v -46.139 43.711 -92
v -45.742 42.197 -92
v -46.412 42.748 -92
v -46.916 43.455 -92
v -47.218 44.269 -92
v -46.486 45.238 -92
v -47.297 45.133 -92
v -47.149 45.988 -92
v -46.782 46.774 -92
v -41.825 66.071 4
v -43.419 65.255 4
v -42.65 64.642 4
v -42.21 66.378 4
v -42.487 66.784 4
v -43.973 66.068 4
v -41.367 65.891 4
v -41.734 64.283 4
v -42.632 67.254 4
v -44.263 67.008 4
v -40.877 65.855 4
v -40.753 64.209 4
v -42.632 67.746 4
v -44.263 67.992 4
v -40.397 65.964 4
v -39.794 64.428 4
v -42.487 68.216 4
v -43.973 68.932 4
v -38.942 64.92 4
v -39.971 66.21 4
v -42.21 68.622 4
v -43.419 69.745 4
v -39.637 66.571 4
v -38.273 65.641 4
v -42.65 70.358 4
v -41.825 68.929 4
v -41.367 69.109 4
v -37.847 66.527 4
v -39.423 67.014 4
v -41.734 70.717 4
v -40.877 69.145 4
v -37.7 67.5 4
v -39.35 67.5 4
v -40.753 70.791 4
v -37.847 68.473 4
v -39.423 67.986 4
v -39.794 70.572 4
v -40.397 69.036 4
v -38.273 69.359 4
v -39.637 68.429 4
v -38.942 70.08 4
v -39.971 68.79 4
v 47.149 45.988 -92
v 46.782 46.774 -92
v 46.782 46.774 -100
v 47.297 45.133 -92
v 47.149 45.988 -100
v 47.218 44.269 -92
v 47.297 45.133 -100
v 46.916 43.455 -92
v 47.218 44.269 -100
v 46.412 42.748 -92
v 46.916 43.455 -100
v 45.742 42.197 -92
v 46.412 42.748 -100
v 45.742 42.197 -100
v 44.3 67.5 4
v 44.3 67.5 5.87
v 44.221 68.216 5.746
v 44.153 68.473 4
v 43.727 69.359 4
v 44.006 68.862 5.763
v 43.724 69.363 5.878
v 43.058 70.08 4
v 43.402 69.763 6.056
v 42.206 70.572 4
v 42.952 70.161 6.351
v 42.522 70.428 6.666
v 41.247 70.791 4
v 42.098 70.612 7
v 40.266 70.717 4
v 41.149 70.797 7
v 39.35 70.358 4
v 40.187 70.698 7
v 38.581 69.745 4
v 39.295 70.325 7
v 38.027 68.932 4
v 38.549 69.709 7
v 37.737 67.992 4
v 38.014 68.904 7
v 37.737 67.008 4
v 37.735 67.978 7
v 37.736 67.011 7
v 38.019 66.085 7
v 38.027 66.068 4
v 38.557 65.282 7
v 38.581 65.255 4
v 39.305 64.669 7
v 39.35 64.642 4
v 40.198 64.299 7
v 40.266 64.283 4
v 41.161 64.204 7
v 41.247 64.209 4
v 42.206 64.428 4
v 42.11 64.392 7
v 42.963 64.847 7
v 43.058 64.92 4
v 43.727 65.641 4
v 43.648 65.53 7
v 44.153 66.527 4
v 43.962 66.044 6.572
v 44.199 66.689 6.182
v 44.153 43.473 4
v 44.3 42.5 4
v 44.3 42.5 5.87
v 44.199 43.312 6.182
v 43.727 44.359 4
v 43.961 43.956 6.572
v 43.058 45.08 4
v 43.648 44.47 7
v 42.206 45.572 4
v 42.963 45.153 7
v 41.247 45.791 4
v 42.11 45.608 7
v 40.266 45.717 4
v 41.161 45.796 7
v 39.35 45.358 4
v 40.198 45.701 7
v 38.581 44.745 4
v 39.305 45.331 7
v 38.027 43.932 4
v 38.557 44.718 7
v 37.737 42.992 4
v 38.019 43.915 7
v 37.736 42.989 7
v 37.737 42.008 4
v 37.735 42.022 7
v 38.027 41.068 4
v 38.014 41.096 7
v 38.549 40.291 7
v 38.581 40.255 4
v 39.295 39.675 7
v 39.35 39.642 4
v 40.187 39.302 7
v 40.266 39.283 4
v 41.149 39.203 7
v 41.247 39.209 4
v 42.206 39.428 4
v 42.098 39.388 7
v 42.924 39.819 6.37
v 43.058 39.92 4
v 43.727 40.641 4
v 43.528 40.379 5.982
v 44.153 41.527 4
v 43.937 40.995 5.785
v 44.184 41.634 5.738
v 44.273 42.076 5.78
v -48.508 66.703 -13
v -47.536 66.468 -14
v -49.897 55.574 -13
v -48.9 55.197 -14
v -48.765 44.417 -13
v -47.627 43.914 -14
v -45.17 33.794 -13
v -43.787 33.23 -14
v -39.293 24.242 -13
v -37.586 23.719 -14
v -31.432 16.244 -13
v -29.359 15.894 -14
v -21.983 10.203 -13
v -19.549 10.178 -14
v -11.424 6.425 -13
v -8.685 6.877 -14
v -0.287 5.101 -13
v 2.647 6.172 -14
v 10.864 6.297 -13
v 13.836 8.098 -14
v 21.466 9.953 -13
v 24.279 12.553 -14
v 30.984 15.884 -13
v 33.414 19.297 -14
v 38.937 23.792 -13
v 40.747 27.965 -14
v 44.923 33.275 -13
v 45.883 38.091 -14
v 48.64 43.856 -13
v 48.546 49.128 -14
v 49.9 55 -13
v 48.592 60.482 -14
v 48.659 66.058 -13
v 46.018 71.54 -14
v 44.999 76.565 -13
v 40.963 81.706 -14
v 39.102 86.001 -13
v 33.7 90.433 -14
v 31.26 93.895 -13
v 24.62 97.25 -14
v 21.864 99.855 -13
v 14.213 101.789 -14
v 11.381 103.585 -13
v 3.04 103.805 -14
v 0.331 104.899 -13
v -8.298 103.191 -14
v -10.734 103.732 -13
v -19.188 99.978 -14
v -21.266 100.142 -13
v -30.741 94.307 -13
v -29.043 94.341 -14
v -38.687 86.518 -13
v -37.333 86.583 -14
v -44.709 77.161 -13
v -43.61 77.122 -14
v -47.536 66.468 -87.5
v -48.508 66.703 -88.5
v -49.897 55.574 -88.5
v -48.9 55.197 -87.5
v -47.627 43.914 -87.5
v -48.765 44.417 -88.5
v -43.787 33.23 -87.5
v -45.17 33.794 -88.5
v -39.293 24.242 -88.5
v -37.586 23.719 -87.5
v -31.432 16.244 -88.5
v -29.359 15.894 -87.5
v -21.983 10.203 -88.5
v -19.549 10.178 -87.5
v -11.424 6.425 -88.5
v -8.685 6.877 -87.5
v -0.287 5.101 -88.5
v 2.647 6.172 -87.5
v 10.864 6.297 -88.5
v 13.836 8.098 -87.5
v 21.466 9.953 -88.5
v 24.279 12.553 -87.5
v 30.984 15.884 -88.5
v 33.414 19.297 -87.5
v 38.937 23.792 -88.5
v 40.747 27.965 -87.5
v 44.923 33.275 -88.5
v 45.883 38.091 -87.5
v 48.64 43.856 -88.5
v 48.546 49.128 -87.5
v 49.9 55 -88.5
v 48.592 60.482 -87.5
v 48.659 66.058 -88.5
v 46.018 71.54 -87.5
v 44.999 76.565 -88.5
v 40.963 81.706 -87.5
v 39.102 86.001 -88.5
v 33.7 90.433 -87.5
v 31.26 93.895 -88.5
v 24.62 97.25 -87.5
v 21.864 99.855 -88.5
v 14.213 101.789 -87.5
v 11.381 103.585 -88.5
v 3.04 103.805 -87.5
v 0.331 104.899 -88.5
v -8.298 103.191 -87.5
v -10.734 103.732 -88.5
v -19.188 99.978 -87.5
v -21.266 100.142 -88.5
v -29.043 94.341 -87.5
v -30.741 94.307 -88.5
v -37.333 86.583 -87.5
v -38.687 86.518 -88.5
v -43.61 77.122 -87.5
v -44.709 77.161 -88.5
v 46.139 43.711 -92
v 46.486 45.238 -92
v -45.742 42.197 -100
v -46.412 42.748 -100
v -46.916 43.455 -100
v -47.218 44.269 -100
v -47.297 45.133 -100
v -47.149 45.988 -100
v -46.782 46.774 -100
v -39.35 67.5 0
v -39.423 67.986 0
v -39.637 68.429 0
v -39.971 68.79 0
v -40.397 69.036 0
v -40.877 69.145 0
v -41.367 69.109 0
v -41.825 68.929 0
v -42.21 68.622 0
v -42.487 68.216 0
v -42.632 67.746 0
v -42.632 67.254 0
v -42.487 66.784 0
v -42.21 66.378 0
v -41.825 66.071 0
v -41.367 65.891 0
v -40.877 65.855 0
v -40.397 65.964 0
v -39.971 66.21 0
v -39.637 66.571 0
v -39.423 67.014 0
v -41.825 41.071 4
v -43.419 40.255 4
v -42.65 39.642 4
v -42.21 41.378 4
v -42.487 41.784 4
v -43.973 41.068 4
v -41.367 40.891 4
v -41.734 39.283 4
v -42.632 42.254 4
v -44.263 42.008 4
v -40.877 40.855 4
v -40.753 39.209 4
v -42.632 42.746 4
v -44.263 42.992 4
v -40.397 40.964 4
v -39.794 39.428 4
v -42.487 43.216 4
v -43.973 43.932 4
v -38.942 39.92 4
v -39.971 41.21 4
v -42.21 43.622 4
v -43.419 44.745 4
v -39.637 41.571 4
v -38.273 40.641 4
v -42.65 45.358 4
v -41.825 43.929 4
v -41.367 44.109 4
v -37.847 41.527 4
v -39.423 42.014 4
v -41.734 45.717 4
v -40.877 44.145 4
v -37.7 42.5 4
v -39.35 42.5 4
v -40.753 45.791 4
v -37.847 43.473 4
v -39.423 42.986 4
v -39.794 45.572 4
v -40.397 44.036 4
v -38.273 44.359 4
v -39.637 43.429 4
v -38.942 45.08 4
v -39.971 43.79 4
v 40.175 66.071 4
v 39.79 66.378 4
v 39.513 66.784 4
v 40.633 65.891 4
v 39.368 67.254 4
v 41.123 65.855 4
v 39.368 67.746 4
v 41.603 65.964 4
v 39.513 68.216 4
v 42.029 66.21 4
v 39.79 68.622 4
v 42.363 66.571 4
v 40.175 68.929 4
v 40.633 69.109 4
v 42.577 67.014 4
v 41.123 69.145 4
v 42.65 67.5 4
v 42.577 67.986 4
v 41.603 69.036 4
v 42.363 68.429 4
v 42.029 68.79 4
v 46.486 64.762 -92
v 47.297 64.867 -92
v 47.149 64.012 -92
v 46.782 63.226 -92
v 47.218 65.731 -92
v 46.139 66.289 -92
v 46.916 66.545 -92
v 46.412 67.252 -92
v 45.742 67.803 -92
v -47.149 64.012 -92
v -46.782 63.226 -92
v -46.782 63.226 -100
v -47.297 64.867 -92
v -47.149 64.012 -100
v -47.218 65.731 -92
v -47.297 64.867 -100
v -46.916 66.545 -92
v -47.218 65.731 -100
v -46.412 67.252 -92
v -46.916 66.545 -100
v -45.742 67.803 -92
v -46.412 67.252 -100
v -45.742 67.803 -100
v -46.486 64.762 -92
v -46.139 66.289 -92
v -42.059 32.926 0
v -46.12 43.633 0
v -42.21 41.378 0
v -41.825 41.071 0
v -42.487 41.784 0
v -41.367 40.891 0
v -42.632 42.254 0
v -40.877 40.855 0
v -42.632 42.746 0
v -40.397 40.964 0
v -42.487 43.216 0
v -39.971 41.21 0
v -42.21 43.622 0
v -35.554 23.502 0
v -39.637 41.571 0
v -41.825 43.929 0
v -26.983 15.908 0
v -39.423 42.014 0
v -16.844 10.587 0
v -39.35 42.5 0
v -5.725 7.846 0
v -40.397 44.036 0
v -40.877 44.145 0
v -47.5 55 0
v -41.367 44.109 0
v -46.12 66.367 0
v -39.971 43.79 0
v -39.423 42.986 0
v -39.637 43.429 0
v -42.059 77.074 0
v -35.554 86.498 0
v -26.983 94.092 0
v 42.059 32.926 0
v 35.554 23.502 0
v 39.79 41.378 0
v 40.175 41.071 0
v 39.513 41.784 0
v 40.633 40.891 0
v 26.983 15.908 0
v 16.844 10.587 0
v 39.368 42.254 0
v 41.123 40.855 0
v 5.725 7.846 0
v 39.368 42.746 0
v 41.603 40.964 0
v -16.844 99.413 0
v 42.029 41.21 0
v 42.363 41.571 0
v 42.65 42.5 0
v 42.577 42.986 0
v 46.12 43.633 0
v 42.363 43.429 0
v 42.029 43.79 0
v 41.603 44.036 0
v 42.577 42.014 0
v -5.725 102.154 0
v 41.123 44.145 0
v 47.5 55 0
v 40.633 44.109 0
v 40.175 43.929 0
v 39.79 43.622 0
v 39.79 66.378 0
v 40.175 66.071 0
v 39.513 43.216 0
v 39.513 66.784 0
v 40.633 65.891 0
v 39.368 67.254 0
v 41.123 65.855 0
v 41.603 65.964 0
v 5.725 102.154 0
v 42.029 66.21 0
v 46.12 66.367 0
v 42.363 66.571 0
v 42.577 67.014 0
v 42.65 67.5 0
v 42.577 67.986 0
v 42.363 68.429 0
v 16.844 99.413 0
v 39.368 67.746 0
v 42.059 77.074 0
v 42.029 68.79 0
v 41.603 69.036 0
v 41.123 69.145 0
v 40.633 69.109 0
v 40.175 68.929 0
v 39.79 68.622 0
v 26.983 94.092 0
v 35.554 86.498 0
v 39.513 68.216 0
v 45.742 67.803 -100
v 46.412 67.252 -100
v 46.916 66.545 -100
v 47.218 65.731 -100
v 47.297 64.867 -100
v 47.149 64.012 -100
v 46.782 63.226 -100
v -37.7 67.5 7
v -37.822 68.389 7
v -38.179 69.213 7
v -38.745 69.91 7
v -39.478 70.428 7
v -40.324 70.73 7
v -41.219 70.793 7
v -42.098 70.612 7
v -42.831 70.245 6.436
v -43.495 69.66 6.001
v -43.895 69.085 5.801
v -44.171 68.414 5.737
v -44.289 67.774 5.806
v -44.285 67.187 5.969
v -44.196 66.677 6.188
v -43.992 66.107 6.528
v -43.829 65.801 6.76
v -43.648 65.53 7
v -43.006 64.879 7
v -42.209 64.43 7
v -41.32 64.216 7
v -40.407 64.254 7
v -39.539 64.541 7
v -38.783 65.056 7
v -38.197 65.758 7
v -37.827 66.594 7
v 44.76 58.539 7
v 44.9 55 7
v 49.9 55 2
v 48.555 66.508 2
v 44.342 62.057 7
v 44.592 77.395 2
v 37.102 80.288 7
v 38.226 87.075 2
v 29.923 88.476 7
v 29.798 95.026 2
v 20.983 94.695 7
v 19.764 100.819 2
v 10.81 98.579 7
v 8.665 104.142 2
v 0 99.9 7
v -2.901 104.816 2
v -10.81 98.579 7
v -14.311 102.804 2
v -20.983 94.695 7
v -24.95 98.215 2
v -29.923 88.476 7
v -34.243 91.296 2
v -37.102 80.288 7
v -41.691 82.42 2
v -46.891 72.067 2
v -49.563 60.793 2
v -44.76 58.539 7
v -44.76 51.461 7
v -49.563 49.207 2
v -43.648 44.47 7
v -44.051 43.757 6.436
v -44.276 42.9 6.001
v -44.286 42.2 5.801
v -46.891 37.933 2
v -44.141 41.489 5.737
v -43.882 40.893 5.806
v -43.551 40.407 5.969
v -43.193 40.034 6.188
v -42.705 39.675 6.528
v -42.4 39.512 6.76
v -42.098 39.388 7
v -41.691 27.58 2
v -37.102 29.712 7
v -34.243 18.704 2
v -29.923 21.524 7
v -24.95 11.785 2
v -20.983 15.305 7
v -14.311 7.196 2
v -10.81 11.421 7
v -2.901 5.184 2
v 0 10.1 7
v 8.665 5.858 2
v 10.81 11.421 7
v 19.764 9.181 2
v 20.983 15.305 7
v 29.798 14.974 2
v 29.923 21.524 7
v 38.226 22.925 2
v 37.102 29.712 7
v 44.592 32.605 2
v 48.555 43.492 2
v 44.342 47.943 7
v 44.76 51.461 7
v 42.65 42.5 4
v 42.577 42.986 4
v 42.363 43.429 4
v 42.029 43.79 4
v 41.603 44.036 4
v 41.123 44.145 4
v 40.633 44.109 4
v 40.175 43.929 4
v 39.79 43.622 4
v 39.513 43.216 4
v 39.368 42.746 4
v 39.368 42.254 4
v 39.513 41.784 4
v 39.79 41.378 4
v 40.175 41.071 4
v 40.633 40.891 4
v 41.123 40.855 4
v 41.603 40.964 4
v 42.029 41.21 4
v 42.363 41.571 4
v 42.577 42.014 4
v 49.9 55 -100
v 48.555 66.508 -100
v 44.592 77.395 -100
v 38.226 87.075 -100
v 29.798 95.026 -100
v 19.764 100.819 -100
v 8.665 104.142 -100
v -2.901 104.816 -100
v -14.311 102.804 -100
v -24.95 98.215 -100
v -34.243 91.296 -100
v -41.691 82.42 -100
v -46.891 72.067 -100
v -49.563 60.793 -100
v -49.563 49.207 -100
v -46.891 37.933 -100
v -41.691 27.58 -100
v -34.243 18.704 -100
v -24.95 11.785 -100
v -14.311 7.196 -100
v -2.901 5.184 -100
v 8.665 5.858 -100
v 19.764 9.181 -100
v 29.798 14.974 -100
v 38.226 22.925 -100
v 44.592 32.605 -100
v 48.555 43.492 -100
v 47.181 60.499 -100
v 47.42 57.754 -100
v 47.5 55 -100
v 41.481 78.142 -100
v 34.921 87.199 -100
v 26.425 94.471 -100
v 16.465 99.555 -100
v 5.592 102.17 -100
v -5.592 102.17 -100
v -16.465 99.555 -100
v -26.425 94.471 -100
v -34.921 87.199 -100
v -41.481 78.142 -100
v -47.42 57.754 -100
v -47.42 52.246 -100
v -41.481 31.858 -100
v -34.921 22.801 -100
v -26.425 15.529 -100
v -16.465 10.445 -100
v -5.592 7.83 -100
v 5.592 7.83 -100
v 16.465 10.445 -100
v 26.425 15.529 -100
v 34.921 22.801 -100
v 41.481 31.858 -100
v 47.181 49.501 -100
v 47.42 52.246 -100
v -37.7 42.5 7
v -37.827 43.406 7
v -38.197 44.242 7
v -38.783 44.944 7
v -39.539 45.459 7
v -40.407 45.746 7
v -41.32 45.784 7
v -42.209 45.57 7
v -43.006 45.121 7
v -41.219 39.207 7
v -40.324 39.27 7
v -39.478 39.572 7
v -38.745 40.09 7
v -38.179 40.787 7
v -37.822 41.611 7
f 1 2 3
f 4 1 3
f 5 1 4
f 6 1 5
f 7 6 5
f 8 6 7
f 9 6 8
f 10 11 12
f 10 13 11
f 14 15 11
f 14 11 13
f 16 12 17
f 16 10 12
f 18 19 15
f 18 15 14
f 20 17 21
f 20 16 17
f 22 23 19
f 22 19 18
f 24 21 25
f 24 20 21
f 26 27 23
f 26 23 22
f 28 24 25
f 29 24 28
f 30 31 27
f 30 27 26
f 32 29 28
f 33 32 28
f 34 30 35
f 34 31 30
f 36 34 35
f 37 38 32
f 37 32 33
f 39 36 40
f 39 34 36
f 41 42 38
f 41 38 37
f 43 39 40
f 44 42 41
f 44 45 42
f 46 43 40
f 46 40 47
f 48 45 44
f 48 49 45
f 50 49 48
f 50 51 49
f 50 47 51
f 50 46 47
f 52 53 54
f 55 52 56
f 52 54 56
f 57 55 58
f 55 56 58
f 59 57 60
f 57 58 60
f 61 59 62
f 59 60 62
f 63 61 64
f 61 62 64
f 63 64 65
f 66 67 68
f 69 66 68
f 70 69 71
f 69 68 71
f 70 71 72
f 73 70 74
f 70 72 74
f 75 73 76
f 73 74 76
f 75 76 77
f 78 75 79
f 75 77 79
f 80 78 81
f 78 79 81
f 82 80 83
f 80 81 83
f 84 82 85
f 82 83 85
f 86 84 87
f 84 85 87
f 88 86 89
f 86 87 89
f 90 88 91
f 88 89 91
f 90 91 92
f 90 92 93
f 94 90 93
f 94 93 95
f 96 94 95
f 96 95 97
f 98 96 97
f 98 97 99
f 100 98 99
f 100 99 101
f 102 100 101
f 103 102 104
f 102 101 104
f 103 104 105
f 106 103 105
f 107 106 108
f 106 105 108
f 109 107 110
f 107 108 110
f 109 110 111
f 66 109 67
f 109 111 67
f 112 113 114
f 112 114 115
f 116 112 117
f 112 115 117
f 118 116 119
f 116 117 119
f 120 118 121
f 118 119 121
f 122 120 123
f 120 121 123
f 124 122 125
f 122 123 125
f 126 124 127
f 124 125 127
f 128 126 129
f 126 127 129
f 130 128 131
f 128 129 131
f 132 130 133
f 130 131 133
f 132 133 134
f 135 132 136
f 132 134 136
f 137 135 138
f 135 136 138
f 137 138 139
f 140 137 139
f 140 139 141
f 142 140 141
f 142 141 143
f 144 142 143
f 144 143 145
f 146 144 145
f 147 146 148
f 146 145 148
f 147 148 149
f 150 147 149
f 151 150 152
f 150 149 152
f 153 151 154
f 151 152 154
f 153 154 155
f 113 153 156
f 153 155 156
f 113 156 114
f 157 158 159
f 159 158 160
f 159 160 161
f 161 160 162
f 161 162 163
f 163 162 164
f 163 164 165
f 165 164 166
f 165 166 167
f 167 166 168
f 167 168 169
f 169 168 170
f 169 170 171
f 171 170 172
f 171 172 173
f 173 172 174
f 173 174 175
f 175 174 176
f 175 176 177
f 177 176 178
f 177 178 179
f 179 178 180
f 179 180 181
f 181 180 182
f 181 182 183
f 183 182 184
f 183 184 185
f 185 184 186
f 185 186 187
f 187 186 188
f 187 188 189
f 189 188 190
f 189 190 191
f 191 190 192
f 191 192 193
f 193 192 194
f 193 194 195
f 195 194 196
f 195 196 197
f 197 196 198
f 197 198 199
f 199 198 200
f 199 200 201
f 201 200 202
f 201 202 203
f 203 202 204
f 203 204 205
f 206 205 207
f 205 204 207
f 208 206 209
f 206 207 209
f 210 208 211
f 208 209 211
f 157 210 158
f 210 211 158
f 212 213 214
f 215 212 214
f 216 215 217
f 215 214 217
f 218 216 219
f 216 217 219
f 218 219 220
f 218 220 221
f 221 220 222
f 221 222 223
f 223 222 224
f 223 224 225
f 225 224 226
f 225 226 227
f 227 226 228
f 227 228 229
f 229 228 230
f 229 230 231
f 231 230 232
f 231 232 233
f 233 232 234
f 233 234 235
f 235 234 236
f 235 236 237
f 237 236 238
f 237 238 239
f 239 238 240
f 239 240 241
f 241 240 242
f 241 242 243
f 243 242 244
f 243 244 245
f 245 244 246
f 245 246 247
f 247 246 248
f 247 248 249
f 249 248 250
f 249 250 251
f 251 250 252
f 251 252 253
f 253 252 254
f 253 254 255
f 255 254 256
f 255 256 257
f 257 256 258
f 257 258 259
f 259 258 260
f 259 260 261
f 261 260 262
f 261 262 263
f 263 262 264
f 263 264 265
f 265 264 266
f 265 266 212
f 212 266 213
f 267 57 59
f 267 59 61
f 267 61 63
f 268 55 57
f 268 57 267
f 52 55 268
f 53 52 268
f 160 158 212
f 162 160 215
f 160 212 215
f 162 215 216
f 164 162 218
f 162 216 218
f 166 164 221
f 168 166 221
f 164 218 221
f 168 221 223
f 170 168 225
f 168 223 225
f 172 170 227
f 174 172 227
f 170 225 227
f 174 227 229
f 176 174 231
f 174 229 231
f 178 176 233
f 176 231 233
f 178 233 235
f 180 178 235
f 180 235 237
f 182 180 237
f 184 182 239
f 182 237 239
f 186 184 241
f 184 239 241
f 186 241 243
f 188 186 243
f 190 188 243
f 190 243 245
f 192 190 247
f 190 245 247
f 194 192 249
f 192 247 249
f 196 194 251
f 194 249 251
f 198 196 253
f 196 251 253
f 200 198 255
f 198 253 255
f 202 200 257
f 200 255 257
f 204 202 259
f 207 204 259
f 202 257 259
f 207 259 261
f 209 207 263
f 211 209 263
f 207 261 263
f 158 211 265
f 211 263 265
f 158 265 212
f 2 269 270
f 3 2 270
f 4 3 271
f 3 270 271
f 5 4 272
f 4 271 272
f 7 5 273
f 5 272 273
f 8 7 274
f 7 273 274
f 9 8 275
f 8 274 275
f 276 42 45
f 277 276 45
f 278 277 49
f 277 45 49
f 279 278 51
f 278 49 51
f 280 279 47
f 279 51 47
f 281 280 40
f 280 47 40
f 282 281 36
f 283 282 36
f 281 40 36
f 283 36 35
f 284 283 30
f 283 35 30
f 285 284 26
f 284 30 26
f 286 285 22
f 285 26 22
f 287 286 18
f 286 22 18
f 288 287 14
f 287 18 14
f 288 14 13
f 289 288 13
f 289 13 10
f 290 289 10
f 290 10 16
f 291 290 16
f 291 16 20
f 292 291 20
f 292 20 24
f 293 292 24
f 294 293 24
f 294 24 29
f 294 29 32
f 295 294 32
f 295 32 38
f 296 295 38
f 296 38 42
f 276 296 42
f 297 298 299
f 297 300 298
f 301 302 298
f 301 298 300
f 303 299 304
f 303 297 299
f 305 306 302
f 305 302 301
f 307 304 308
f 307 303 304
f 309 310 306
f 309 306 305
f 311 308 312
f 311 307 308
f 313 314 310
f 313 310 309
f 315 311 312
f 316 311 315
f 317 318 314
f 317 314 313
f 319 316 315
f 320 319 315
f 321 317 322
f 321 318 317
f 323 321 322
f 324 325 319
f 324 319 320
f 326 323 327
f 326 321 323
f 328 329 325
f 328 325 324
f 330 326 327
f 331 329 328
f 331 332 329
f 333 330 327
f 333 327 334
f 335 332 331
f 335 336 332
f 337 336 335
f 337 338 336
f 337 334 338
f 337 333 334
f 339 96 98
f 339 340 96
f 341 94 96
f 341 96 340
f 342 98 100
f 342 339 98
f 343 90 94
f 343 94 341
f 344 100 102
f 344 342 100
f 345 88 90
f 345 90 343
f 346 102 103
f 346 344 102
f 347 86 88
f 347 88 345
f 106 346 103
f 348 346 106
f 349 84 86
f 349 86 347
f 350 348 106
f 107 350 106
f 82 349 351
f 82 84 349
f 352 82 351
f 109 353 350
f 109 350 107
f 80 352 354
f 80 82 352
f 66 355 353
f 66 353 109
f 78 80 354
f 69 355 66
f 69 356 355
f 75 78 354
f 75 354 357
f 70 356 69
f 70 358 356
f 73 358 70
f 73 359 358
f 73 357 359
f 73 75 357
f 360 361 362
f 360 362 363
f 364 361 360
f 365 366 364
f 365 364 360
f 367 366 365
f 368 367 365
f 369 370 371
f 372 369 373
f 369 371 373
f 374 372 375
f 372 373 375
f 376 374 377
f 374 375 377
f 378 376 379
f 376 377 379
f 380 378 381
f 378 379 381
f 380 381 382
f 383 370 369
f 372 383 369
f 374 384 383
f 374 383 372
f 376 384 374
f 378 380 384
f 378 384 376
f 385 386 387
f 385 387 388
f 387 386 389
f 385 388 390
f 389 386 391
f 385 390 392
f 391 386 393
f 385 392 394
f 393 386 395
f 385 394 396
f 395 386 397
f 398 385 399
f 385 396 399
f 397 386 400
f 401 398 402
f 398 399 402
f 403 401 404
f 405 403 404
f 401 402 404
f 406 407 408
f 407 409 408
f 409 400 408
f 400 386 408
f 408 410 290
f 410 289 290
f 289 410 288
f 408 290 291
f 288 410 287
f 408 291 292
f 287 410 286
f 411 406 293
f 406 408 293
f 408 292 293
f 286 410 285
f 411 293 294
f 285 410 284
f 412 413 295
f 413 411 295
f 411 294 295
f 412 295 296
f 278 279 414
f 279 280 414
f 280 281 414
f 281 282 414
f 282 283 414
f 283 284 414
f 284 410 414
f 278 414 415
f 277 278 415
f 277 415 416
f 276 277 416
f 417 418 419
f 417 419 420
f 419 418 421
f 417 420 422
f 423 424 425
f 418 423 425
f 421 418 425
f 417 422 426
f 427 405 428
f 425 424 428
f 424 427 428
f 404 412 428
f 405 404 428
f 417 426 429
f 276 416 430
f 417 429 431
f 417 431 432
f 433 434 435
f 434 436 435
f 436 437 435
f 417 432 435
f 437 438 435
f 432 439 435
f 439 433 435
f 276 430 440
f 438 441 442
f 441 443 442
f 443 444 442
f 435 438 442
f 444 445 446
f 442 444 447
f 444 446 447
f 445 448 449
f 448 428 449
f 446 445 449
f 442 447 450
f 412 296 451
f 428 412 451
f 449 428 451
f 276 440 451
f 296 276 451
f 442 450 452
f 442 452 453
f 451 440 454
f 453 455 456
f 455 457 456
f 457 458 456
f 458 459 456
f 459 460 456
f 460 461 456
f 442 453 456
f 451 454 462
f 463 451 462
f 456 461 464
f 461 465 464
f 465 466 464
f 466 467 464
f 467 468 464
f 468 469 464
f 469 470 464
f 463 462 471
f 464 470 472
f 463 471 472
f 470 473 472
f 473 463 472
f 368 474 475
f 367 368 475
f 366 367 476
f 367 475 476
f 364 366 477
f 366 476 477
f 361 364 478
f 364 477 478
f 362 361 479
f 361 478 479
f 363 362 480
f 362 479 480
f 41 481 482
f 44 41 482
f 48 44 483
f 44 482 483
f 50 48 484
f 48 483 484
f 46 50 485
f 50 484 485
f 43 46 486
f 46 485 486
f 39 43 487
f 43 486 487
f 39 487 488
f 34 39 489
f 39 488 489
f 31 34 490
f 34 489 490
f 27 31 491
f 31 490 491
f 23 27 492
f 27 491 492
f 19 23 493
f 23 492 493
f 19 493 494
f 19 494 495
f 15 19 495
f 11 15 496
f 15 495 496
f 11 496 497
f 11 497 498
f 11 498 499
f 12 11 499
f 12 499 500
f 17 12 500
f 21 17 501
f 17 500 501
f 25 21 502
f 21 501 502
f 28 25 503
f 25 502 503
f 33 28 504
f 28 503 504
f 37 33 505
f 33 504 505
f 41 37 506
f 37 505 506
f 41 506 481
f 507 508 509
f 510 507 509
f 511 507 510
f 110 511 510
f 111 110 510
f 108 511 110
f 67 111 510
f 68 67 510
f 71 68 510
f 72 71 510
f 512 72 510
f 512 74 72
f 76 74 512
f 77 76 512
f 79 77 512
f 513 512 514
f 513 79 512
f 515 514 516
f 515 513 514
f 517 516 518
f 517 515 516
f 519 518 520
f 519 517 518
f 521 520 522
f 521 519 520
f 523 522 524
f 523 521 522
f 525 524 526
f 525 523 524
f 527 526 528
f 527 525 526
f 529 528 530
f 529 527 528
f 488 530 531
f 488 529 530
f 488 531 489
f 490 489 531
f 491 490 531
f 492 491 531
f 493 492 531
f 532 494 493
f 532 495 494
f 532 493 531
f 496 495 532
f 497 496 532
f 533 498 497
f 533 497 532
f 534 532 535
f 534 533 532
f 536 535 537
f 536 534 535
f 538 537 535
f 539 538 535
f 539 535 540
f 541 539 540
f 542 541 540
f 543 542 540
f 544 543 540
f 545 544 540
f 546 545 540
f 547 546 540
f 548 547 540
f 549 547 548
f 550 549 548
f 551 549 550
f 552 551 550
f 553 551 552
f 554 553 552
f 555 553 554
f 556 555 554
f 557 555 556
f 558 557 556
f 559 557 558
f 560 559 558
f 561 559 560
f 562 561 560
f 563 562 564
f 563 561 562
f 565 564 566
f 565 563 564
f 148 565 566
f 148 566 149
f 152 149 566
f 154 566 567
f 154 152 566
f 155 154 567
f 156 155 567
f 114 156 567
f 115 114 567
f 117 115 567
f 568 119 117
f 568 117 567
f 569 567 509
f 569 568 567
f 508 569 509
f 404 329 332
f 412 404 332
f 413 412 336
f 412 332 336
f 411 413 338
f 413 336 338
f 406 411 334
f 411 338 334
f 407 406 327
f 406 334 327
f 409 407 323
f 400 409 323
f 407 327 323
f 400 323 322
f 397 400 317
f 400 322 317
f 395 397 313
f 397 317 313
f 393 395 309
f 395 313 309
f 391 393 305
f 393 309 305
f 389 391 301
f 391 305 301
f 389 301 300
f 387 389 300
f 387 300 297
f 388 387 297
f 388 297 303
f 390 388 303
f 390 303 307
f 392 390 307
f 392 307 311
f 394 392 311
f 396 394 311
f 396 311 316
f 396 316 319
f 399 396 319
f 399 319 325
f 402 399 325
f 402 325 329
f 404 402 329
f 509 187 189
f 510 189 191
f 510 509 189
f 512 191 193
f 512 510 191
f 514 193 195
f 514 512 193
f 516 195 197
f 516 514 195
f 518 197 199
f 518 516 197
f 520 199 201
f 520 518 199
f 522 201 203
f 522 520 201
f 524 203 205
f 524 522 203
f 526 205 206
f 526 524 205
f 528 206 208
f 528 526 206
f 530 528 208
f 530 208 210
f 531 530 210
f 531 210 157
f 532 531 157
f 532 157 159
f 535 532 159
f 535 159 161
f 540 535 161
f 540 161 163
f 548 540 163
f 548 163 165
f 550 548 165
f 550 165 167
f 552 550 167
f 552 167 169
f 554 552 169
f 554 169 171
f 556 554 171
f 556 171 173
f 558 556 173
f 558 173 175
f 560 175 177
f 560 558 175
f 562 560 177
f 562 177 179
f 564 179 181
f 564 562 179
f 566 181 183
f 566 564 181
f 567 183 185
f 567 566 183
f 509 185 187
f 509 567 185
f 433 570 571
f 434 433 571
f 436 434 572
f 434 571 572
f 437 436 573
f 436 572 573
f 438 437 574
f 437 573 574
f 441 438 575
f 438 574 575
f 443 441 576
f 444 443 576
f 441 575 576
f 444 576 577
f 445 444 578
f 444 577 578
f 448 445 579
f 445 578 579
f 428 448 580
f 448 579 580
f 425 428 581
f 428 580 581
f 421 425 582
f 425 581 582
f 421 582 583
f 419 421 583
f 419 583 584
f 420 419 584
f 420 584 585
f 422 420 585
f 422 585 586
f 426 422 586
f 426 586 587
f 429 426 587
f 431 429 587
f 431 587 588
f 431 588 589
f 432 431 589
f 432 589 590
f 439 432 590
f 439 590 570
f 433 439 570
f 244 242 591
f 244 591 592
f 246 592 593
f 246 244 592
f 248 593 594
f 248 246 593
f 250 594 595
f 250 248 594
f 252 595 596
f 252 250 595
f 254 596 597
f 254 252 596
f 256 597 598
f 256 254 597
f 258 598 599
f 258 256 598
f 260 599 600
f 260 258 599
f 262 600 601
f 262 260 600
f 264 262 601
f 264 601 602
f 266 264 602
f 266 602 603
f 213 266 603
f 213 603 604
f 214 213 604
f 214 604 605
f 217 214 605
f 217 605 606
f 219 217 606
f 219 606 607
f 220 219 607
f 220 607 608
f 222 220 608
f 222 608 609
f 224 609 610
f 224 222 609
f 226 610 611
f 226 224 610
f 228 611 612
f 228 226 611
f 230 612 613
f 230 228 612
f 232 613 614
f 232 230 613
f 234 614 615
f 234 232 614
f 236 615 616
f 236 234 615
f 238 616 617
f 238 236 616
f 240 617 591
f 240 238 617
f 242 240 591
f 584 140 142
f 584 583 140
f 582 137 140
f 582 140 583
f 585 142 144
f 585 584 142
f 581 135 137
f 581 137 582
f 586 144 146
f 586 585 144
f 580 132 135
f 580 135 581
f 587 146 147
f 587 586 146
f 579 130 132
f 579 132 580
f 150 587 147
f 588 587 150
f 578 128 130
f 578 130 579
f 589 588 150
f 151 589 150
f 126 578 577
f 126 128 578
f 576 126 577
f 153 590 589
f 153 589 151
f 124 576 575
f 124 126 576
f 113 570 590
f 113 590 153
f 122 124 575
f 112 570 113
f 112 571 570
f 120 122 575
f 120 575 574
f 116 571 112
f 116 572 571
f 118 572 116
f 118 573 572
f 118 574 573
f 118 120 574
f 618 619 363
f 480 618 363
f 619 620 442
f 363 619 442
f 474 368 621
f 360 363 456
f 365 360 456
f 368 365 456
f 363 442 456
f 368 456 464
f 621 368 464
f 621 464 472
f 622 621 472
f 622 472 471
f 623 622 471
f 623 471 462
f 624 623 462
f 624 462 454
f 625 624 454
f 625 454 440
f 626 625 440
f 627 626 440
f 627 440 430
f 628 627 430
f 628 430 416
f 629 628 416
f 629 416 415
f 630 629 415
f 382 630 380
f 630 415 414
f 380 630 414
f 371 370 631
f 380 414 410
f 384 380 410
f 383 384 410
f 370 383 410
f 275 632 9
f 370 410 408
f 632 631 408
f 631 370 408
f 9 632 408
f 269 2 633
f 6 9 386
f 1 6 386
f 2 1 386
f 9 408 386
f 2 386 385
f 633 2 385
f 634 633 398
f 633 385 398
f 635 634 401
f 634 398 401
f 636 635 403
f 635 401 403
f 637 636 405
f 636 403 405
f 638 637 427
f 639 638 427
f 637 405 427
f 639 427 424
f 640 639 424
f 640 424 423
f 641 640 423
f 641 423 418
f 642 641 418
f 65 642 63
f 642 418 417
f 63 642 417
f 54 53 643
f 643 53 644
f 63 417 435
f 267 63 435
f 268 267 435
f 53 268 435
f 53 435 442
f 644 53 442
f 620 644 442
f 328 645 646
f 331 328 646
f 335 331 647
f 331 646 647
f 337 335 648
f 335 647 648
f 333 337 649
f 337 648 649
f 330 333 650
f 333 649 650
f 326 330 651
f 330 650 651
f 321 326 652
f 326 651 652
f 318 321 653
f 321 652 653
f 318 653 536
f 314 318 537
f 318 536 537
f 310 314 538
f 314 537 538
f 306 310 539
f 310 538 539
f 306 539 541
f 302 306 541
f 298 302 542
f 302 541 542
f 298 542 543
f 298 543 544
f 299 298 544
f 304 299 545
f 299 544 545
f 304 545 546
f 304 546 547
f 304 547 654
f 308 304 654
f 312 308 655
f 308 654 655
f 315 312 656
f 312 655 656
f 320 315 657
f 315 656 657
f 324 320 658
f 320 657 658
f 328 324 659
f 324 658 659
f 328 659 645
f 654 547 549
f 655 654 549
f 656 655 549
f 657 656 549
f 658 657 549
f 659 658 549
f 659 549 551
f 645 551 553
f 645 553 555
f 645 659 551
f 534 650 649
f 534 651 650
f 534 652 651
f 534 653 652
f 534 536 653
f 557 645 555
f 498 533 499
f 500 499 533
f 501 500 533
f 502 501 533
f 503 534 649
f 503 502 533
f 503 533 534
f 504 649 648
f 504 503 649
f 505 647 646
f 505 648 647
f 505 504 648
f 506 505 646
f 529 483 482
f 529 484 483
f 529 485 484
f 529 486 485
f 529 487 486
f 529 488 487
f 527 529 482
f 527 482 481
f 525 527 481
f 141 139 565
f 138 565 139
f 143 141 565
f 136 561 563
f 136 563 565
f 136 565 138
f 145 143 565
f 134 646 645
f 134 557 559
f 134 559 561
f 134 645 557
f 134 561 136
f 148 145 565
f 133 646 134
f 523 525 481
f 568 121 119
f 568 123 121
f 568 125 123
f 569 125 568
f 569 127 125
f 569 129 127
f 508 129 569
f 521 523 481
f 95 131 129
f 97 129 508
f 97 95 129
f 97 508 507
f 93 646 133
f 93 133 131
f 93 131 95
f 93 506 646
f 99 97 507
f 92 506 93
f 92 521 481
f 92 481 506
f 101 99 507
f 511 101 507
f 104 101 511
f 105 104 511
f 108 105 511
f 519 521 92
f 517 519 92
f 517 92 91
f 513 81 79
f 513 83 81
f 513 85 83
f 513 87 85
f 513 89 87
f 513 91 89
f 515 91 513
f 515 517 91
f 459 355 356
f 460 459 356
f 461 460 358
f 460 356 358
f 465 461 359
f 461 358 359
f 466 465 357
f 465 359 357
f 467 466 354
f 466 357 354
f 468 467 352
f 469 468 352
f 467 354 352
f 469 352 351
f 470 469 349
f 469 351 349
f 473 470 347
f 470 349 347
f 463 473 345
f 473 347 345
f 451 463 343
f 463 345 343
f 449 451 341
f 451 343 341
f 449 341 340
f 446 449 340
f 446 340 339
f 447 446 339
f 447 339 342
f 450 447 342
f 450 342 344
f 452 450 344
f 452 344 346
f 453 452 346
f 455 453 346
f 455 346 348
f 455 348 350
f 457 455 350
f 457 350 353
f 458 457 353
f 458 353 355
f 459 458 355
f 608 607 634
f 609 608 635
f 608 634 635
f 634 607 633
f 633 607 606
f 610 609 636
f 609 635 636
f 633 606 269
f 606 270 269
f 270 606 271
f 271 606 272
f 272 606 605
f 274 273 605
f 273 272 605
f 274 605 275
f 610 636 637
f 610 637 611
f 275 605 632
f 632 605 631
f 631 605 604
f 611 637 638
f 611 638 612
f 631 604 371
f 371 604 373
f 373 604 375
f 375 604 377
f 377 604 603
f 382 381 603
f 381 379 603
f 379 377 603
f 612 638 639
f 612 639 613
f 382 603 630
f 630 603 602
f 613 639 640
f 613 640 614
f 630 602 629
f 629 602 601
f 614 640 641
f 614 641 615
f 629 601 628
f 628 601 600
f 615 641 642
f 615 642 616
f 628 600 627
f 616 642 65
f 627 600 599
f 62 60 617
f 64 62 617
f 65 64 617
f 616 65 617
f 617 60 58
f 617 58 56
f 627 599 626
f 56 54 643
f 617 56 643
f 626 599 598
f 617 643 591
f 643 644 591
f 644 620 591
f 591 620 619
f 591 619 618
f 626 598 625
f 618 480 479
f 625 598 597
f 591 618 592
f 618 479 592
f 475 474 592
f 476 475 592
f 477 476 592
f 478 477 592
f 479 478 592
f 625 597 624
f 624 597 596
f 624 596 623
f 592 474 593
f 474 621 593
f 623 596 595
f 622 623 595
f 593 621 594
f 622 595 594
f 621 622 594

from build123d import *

# Parameters (mm, degrees)
SKETCH1_R           = 49.9
SKETCH1_R_2         = 47.5
BOSS_EXTRUDE1_DEPTH = 100
BOSS_EXTRUDE2_START = 7
SKETCH2_R           = 49.9
SKETCH2_R_2         = 1.65
BOSS_EXTRUDE2_DEPTH = 7
SKETCH3_R           = 3.3
CUT_EXTRUDE1_DEPTH  = 3
CHAMFER1_SIZE       = 5
SKETCH5_R           = 3.3
CUT_EXTRUDE2_DEPTH  = 8


with BuildPart() as part:
    # Sketch1 → Boss-Extrude1 (new body)
    with BuildSketch(Plane.XY):
        with Locations((0, 55)):
            Circle(SKETCH1_R)
        with Locations((0, 55)):
            Circle(SKETCH1_R_2, mode=Mode.SUBTRACT)
    extrude(amount=-BOSS_EXTRUDE1_DEPTH)

    # Sketch2 → Boss-Extrude2 (add)
    with BuildSketch(Plane.XY.offset(BOSS_EXTRUDE2_START)):
        with Locations((0, 55)):
            Circle(SKETCH2_R)
        with Locations((41, 67.5)):
            Circle(SKETCH2_R_2, mode=Mode.SUBTRACT)
        with Locations((41, 42.5)):
            Circle(SKETCH2_R_2, mode=Mode.SUBTRACT)
        with Locations((-41, 67.5)):
            Circle(SKETCH2_R_2, mode=Mode.SUBTRACT)
        with Locations((-41, 42.5)):
            Circle(SKETCH2_R_2, mode=Mode.SUBTRACT)
    extrude(amount=-BOSS_EXTRUDE2_DEPTH)

    # Sketch3 → Cut-Extrude1 (cut)
    with BuildSketch(Plane.XY.offset(7)):
        with Locations((-41, 67.5)):
            Circle(SKETCH3_R)
        with Locations((-41, 42.5)):
            Circle(SKETCH3_R)
        with Locations((41, 67.5)):
            Circle(SKETCH3_R)
        with Locations((41, 42.5)):
            Circle(SKETCH3_R)
    extrude(amount=-CUT_EXTRUDE1_DEPTH, mode=Mode.SUBTRACT)

    # Chamfer1
    # the kernel refuses this chamfer: 5 mm, written as the material it takes off along each edge
    with BuildSketch(Plane(origin=(0, 55, 7), x_dir=(1, 0, 0), z_dir=(0, -1, 0))) as chamfer1_piece_1:
        Polygon((49.9, -CHAMFER1_SIZE), (49.9 - CHAMFER1_SIZE, 0), (49.9, 0), align=None)
    revolve(axis=Axis((0, 55, 7), (0, 0, 1)), mode=Mode.SUBTRACT)

    # Sketch4 → Cut-Revolve1 (revolve, cut)
    with BuildSketch(Plane(origin=(0, 0, 0), x_dir=(0, 0, -1), z_dir=(1, 0, 0)), mode=Mode.PRIVATE) as cut_revolve1_sk:
        Polygon((13, 104.9), (14, 103.9), (87.5, 103.9), (88.5, 104.9), align=None)
    revolve(cut_revolve1_sk.sketch.rotate(Axis((0, 55, 2), (0, 0, 1)), 76.43618314), axis=Axis((0, 55, 2), (0, 0, 1)), mode=Mode.SUBTRACT)

    # Sketch5 → Cut-Extrude2 (cut)
    with BuildSketch(Plane(origin=(0, 0, -100), x_dir=(-1, 0, 0), z_dir=(0, 0, -1))):
        with Locations((-44, 45)):
            Circle(SKETCH5_R)
        with Locations((-44, 65)):
            Circle(SKETCH5_R)
        with Locations((44, 45)):
            Circle(SKETCH5_R)
        with Locations((44, 65)):
            Circle(SKETCH5_R)
    extrude(amount=-CUT_EXTRUDE2_DEPTH, mode=Mode.SUBTRACT)


solid = part.part
